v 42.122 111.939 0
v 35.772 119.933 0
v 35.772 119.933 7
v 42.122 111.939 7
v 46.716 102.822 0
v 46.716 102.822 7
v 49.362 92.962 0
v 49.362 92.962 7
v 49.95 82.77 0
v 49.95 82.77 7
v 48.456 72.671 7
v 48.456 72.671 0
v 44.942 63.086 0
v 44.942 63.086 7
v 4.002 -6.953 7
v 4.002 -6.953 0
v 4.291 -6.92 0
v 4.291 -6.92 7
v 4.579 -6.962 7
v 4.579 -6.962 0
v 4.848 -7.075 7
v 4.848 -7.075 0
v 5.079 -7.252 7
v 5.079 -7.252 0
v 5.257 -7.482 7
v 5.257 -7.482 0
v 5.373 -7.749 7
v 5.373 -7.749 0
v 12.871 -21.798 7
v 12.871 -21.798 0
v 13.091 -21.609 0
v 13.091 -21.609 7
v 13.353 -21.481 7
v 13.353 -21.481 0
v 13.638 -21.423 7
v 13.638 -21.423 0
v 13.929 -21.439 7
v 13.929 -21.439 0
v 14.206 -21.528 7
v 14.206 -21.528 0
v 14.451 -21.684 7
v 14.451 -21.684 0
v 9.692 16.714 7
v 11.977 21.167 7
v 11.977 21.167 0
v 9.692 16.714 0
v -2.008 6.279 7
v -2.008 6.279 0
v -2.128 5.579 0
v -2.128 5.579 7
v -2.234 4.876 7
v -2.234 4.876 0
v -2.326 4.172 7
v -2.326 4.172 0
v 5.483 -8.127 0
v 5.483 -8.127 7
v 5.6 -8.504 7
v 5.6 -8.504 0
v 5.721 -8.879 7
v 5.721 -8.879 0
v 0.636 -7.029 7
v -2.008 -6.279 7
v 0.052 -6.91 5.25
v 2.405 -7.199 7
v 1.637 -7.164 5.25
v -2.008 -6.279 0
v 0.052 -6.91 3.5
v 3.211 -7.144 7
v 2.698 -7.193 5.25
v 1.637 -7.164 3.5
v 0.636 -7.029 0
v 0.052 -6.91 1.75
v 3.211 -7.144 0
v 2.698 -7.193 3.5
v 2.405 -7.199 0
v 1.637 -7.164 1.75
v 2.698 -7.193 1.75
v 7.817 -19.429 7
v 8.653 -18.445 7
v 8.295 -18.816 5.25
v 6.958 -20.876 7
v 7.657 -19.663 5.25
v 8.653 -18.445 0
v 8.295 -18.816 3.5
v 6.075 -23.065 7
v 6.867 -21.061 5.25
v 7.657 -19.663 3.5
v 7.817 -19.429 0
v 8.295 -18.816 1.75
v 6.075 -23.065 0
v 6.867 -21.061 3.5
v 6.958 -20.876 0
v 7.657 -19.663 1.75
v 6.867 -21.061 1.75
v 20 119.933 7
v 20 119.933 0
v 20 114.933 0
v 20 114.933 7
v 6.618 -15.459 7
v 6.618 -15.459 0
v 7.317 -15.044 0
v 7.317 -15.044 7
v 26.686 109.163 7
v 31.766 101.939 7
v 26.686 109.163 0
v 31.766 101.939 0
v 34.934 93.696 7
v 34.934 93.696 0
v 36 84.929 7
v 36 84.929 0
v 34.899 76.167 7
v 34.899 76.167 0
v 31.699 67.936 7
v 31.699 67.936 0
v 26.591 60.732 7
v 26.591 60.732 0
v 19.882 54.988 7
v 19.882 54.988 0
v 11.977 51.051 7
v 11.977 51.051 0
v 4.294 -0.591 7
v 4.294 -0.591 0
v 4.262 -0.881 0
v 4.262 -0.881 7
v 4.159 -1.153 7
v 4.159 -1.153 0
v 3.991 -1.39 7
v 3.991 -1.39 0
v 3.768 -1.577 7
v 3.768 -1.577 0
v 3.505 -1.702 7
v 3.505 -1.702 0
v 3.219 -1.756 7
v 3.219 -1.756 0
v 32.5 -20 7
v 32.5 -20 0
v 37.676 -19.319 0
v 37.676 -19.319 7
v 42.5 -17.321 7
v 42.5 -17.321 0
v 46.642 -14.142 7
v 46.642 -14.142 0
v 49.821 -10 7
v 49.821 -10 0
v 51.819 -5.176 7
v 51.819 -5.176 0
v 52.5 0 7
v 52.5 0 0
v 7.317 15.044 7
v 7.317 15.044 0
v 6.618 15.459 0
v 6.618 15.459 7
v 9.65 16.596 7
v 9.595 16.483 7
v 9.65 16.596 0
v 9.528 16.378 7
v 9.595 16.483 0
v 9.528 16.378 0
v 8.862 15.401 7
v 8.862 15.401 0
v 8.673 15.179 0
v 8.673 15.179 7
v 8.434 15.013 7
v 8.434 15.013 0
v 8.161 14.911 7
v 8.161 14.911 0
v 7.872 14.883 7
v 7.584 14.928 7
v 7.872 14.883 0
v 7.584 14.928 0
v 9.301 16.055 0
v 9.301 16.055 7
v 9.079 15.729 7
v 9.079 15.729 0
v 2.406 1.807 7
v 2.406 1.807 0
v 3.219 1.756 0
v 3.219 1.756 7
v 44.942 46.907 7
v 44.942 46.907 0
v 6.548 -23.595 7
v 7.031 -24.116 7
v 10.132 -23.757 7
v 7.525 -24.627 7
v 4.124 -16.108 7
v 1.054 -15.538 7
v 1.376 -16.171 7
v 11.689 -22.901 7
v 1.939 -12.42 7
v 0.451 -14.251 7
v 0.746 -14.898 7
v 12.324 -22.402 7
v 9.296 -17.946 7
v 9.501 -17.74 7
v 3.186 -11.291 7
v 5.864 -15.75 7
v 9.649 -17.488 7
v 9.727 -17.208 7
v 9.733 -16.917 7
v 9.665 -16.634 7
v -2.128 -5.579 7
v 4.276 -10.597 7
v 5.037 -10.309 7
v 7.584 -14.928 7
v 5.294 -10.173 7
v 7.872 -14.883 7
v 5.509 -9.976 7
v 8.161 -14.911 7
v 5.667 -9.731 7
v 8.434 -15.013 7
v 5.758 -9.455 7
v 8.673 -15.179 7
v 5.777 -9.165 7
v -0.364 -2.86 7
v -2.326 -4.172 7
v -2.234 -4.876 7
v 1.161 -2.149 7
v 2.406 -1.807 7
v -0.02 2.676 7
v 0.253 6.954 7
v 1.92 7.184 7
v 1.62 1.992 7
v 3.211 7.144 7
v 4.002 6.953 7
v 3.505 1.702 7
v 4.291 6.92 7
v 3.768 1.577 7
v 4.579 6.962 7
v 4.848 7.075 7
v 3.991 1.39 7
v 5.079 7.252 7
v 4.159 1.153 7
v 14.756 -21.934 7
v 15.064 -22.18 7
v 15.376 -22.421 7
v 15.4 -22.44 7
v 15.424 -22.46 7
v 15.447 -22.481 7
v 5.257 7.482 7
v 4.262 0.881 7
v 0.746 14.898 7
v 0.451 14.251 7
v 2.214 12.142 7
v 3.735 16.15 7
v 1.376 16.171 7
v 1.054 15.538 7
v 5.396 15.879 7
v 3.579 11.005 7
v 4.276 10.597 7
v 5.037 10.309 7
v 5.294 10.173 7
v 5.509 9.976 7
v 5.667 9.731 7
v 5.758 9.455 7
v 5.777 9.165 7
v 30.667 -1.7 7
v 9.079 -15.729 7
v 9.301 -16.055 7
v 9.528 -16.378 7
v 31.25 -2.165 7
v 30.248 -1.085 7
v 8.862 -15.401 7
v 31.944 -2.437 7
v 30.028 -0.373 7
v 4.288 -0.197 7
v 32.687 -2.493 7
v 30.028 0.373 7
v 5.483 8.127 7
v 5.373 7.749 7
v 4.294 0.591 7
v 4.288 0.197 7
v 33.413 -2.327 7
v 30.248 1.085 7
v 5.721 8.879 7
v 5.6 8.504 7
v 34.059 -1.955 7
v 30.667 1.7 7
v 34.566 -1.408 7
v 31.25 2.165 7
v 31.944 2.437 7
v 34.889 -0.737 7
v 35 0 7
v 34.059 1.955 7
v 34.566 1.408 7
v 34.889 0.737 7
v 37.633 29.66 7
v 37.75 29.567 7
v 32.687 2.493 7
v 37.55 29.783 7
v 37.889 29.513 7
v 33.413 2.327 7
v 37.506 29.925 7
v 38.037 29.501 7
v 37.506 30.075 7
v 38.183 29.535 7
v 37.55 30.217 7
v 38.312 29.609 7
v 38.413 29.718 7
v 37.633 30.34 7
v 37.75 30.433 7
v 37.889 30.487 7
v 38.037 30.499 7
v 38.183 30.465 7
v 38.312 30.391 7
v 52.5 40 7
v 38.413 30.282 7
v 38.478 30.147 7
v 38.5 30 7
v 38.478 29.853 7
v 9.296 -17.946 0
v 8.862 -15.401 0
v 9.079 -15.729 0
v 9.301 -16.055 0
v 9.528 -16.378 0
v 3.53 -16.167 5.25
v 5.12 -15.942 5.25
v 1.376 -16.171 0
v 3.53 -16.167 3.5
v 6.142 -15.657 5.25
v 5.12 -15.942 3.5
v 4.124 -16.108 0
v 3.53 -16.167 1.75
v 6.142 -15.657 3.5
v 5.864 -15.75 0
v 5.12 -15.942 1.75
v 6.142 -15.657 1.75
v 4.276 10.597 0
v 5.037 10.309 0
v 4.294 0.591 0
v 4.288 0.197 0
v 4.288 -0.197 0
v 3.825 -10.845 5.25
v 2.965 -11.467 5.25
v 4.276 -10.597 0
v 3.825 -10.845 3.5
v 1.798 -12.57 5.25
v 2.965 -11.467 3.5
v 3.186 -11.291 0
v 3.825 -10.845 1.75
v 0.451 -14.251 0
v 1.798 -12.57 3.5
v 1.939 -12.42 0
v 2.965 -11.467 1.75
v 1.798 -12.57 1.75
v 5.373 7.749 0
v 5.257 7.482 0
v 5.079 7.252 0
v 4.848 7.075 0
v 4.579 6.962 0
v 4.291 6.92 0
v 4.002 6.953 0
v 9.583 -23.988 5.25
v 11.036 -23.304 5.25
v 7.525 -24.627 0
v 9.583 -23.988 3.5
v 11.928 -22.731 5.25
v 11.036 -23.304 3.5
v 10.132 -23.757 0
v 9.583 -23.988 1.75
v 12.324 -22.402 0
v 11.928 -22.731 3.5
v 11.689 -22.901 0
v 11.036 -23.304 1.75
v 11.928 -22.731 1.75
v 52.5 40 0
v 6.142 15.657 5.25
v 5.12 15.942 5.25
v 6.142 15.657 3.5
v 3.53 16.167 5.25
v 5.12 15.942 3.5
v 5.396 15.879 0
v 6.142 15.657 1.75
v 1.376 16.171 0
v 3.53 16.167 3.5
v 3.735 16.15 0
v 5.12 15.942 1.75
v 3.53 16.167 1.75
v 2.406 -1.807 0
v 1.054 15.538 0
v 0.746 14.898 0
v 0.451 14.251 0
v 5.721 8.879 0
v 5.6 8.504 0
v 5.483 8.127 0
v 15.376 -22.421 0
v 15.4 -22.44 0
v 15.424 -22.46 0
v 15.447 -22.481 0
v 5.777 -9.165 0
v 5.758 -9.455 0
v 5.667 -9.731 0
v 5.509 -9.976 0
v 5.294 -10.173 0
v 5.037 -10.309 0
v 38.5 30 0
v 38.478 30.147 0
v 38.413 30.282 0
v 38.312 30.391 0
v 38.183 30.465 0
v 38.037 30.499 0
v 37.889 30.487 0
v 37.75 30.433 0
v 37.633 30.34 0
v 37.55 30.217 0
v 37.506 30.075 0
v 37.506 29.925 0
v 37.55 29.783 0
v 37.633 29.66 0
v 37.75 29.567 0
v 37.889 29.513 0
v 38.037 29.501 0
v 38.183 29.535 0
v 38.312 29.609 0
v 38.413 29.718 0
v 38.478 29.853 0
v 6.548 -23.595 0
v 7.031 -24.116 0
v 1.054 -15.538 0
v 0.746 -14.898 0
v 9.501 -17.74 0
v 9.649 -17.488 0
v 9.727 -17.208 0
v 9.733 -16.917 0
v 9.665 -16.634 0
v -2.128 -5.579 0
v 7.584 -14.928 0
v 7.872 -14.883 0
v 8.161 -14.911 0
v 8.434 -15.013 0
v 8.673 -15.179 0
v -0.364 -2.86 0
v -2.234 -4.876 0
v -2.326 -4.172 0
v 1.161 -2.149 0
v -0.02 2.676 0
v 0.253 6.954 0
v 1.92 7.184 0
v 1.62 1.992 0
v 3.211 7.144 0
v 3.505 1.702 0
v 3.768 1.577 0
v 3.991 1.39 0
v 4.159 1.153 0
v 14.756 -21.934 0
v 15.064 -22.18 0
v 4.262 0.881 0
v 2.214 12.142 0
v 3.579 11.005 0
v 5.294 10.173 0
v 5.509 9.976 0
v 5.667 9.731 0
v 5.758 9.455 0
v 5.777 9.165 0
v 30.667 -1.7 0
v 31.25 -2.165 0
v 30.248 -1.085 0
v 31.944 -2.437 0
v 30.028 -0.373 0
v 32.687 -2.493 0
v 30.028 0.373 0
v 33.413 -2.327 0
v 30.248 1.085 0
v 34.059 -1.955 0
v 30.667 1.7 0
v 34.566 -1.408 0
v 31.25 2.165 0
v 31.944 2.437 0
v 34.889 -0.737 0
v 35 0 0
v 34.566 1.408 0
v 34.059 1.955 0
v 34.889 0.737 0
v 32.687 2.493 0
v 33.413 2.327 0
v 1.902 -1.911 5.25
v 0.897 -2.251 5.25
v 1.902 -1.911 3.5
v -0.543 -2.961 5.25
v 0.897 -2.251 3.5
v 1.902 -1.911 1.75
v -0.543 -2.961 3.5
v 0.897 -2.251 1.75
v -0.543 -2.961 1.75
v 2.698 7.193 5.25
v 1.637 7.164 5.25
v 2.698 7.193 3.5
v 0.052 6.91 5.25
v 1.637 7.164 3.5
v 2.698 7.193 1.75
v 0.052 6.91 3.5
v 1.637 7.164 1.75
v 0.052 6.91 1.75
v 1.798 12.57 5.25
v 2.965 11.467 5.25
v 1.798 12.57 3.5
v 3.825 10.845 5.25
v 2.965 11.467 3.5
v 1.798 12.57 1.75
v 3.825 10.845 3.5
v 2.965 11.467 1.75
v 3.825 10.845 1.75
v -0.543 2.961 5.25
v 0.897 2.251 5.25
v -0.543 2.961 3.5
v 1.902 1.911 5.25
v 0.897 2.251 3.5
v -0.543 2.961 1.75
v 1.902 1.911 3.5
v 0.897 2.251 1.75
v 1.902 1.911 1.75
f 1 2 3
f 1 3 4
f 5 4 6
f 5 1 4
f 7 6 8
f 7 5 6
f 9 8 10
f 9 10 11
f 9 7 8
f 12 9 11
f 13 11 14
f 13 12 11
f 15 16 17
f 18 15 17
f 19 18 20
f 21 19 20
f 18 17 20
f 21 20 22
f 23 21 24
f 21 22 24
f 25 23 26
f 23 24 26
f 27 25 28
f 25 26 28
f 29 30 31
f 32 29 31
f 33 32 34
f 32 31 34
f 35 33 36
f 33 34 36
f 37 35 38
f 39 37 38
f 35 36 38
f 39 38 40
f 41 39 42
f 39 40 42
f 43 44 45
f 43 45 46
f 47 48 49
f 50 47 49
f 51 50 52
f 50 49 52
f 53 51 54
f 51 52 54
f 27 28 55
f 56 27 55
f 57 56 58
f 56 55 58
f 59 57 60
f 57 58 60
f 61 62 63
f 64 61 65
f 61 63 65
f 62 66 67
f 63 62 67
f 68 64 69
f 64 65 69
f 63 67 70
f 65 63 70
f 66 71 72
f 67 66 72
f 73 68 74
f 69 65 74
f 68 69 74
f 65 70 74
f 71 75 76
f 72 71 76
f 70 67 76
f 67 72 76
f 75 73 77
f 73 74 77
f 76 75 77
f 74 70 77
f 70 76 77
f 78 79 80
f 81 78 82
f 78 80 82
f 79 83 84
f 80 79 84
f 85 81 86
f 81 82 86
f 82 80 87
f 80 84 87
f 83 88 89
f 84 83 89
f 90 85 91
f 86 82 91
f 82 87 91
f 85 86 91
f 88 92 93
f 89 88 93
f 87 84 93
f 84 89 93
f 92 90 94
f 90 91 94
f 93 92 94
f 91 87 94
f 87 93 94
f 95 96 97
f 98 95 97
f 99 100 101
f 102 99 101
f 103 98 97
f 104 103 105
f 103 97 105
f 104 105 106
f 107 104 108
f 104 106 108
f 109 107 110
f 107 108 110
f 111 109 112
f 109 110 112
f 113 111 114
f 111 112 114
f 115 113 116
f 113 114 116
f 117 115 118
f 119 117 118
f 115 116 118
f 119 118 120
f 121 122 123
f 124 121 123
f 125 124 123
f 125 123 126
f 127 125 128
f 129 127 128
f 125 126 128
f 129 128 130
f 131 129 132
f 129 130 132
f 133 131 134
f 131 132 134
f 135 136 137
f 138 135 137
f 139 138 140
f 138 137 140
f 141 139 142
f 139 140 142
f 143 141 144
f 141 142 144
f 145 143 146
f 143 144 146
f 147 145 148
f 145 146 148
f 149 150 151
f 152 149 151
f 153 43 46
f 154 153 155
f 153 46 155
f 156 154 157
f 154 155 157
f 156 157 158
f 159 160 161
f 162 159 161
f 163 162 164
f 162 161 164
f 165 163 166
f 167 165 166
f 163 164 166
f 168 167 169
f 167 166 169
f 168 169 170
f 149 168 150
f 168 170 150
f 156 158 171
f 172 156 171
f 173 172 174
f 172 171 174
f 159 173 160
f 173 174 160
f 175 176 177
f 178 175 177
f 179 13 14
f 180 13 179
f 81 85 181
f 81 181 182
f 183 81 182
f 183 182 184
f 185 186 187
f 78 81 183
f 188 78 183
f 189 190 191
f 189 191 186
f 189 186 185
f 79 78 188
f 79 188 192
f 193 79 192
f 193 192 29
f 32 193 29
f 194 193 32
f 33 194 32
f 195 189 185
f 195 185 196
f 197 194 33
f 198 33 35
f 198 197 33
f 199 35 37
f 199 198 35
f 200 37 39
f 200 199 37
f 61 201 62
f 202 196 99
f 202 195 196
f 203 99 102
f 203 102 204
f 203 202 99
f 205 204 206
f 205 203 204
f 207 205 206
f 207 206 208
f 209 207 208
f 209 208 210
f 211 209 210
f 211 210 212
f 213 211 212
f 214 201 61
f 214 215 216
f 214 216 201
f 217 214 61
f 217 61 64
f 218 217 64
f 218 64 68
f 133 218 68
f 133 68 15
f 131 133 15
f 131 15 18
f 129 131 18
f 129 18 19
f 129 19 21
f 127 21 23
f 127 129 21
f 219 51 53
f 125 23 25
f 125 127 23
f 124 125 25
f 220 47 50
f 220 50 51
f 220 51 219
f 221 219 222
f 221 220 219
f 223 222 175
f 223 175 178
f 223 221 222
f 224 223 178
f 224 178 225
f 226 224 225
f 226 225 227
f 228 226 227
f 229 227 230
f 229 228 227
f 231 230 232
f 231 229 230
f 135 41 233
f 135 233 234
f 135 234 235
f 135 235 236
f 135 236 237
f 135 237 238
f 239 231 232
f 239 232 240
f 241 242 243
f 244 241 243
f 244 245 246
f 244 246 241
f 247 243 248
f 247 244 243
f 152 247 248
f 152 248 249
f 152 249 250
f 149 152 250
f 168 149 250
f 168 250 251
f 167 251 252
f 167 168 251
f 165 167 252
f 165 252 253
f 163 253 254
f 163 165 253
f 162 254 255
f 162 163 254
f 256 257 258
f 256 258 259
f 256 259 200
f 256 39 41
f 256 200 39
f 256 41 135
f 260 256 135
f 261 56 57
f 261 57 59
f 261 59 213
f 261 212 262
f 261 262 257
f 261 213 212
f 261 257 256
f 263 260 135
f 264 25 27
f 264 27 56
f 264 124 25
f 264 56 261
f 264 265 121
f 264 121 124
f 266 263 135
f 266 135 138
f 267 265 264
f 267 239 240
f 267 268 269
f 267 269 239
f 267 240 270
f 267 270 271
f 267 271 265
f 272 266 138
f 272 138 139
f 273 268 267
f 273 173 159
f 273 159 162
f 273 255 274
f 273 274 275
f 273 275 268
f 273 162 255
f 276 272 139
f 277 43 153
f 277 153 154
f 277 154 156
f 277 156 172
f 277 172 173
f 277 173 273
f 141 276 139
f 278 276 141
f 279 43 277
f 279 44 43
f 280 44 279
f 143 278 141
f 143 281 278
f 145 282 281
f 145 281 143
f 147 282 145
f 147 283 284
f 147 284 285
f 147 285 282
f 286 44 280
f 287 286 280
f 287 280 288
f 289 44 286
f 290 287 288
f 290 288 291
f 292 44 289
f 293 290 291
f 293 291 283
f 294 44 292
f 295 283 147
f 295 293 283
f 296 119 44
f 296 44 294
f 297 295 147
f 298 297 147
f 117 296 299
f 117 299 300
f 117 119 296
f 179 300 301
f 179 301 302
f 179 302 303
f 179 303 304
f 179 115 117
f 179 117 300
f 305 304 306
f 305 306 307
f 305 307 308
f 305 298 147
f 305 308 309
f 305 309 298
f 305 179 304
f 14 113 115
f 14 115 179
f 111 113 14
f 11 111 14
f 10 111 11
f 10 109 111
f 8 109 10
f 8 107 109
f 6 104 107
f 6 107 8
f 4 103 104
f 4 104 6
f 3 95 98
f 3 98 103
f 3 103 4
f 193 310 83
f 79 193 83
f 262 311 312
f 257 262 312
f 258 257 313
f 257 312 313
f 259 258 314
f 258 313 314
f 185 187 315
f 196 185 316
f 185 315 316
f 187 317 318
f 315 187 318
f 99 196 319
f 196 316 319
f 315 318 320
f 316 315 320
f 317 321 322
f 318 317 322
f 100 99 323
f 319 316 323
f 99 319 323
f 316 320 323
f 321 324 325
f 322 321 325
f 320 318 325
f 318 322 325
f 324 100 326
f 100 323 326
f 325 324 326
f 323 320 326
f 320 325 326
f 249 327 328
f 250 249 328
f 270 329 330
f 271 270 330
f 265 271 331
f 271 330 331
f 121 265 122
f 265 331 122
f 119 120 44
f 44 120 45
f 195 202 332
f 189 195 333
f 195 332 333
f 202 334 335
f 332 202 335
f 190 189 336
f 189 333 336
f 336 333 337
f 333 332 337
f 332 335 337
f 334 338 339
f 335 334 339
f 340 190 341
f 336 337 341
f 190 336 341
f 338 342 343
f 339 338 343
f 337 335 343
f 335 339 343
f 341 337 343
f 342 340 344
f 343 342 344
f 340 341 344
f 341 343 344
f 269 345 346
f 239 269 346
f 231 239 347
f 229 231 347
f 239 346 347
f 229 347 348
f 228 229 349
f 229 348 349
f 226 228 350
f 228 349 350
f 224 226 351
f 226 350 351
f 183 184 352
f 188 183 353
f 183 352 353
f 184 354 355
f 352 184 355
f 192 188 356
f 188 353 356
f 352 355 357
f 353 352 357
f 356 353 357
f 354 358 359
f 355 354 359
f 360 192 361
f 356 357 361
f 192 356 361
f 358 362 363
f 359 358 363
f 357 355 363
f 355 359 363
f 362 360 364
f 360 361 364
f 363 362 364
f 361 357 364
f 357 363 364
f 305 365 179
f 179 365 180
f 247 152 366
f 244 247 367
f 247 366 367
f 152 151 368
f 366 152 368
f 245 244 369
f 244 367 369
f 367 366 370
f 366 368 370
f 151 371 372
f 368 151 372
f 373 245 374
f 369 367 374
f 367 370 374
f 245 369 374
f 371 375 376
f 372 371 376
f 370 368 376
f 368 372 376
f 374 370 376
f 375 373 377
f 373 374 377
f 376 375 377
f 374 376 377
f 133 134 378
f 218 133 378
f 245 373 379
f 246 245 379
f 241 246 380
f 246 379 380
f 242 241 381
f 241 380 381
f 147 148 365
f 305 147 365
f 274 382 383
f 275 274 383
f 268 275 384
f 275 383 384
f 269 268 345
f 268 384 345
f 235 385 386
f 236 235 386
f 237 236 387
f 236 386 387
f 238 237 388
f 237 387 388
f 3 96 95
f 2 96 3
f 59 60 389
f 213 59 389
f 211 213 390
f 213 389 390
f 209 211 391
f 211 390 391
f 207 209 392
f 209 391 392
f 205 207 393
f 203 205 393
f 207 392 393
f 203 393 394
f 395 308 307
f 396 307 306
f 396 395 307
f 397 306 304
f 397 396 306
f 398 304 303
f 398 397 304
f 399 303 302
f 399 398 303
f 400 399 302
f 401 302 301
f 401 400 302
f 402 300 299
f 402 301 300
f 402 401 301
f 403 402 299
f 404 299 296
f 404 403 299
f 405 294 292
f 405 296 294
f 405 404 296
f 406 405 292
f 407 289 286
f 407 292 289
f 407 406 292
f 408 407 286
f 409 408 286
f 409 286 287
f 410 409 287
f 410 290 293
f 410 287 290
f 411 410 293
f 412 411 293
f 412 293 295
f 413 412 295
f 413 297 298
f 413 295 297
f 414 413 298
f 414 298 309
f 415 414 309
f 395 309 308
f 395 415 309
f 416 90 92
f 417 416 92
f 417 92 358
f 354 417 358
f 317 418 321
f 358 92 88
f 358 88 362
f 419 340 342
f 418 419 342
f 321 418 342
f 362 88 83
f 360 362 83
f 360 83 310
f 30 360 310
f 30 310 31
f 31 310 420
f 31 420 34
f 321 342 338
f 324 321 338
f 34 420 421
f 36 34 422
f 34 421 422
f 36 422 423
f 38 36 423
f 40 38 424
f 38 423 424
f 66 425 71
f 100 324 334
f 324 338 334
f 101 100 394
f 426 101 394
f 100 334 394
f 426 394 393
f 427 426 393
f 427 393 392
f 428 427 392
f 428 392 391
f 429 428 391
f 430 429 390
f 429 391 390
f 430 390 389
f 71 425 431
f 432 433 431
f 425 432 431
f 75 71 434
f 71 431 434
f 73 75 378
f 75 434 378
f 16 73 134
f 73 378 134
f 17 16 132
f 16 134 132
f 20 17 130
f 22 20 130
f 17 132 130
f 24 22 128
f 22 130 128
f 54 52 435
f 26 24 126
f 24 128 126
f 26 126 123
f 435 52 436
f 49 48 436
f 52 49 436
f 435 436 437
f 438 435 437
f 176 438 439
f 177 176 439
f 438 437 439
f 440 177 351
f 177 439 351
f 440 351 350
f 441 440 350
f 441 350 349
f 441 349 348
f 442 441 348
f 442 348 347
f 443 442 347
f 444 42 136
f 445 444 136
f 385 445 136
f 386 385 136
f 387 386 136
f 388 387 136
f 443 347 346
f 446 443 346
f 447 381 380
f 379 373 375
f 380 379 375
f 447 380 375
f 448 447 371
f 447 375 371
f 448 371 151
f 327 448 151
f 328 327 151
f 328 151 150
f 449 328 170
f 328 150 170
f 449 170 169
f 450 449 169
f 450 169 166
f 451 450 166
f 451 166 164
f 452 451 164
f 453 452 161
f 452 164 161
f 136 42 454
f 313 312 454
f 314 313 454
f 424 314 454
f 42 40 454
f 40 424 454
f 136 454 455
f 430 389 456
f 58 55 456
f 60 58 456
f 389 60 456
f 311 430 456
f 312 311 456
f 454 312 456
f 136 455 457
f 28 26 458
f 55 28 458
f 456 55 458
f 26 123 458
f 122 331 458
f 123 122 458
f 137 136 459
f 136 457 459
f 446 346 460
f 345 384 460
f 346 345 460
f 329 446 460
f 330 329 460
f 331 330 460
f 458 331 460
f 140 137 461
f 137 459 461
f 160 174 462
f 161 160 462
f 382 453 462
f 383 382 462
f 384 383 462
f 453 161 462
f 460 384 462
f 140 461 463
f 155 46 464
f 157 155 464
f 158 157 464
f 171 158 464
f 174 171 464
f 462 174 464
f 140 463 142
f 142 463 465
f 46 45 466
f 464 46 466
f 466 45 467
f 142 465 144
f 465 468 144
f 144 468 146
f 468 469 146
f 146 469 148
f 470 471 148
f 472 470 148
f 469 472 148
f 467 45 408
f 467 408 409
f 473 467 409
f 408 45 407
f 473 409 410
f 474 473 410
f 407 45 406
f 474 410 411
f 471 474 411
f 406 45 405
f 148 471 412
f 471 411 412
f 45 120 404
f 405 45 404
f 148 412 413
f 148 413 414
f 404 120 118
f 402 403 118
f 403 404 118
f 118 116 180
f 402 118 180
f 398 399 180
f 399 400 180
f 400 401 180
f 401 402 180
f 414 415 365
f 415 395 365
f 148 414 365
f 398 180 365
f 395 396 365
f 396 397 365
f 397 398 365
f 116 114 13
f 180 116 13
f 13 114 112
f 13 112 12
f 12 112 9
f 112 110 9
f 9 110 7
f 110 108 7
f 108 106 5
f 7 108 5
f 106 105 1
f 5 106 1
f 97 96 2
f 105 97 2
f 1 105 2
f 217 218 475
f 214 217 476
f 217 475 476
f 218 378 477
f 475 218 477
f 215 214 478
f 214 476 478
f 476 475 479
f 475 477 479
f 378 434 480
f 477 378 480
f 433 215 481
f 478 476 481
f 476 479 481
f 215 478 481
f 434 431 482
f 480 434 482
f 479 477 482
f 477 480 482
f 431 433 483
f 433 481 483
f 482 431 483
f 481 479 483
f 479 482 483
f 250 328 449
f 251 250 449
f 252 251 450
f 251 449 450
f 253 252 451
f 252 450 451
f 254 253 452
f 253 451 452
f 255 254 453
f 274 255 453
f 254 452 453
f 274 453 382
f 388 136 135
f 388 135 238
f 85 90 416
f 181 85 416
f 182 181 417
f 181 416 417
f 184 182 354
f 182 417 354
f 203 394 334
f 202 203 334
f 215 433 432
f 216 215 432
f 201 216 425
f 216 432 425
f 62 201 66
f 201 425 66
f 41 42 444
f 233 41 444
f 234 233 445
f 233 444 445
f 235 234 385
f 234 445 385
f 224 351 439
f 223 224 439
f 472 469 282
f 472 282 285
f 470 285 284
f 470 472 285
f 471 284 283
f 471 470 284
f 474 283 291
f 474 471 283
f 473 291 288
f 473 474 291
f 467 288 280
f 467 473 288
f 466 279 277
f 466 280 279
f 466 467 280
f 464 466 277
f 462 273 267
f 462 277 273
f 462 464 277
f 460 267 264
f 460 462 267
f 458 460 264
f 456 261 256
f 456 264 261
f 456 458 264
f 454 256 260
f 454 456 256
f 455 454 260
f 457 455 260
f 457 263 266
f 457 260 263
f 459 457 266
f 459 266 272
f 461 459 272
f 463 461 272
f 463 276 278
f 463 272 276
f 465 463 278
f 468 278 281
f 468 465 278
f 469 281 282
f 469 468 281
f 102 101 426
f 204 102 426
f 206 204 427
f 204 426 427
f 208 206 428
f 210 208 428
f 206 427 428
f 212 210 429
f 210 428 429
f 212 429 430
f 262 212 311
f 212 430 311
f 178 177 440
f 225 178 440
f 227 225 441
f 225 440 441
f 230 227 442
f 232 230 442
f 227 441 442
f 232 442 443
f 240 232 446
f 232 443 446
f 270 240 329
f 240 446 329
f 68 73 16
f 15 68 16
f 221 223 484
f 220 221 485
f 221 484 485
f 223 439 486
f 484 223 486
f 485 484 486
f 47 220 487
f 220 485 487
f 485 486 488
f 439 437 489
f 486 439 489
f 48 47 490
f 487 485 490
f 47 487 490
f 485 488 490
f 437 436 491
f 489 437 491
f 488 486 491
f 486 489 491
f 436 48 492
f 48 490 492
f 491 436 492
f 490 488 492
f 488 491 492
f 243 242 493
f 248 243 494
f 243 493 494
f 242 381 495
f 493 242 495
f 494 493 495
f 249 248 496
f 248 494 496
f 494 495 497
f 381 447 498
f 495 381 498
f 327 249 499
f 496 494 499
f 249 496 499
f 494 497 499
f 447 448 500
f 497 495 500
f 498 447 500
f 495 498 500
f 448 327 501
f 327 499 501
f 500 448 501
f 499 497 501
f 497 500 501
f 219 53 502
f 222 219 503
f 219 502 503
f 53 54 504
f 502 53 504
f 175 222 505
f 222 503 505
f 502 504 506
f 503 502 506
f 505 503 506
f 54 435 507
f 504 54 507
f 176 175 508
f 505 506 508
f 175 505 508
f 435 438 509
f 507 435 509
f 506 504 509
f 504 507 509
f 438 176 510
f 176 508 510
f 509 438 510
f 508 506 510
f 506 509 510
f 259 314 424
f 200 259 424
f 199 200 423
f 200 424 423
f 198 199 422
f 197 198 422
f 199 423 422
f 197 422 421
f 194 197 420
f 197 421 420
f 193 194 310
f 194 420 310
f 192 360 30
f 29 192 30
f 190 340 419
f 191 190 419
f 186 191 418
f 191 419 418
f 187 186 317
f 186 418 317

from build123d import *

# Parameters (mm, degrees)
CYLINDER002_R     = 0.5
CYLINDER002_DEPTH = 15
PAD005_DEPTH      = 10
CYLINDER001_R     = 2.5
CYLINDER001_DEPTH = 30
PAD_DEPTH         = 7
PAD001_DEPTH      = 7


with BuildPart() as fixation_servo:
    # Cylinder002 → Cylinder002 (new body)
    with BuildSketch(Plane(origin=(38, 30, 0), x_dir=(1, 0, 0), z_dir=(0, 0, 1))):
        Circle(CYLINDER002_R)
    extrude(amount=CYLINDER002_DEPTH)


with BuildPart() as gearcutter_d:
    # Sketch007 → Pad005 (new body)
    with BuildSketch(Plane.XY):
        with BuildLine():
            Line((20, 31.95888), (45.304215, 31.95888))
            Line((45.304215, 31.95888), (45.304215, -33.652056))
            Line((45.304215, -33.652056), (23.213182, -33.652056))
            Line((-17.372387, -39.01239), (23.213182, -33.652056))
            Line((-25.984375, -33.578197), (-17.372387, -39.01239))
            Line((-17.23691, -22.507347), (-25.984375, -33.578197))
            Line((7e-06, -20), (-17.23691, -22.507347))
            ThreePointArc((7e-06, -20), (14.142138, -14.142133), (20, 0))
            Line((20, 0), (20, 31.95888))
        make_face()
        Polygon((-20, 22.185684), (-22.978563, 16.381247), (-30, 23.81991), (-24.00174, 30), align=None)
    extrude(amount=PAD005_DEPTH)


with BuildPart() as hole:
    # Cylinder001 → Cylinder001 (new body)
    with BuildSketch(Plane.XY.offset(-10)):
        Circle(CYLINDER001_R)
    extrude(amount=CYLINDER001_DEPTH)


with BuildPart() as cut002:
    # InvoluteGear → Pad (new body)
    with BuildSketch(Plane.XY):
        with BuildLine():
            Line((29.216017, -2.627852), (30.02668, -2.698596))
            add(Edge.make_bspline(
                [(30.02668, -2.698596), (30.269336, -2.702327), (31.240634, -2.684194), (32.940327, -2.265756), (35.058609, -1.065575)],
                knots=[0, 0, 0, 0, 0, 1, 1, 1, 1, 1], degree=4))
            ThreePointArc((35.058609, -1.065575), (35.074799, 0), (35.058609, 1.065575))
            add(Edge.make_bspline(
                [(35.058609, 1.065575), (32.940327, 2.265756), (31.240634, 2.684194), (30.269336, 2.702327), (30.02668, 2.698596)],
                knots=[0, 0, 0, 0, 0, 1, 1, 1, 1, 1], degree=4))
            Line((30.02668, 2.698596), (29.216017, 2.627852))
            ThreePointArc((29.216017, 2.627852), (28.398075, 2.874673), (27.979368, 3.61941))
            ThreePointArc((27.979368, 3.61941), (27.89739, 4.204855), (27.803163, 4.788454))
            ThreePointArc((27.803163, 4.788454), (27.983753, 5.62352), (28.692604, 6.100468))
            Line((28.692604, 6.100468), (29.488104, 6.271815))
            add(Edge.make_bspline(
                [(29.488104, 6.271815), (29.72108, 6.339774), (30.64388, 6.643396), (32.144724, 7.544237), (33.815137, 9.315472)],
                knots=[0, 0, 0, 0, 0, 1, 1, 1, 1, 1], degree=4))
            ThreePointArc((33.815137, 9.315472), (33.516524, 10.338478), (33.18697, 11.351941))
            add(Edge.make_bspline(
                [(33.18697, 11.351941), (30.809038, 11.874427), (29.06152, 11.773281), (28.12803, 11.504313), (27.897254, 11.429224)],
                knots=[0, 0, 0, 0, 0, 1, 1, 1, 1, 1], degree=4))
            Line((27.897254, 11.429224), (27.143458, 11.122676))
            ThreePointArc((27.143458, 11.122676), (26.289104, 11.117439), (25.669483, 11.705673))
            ThreePointArc((25.669483, 11.705673), (25.418584, 12.240945), (25.156525, 12.770842))
            ThreePointArc((25.156525, 12.770842), (25.082952, 13.622039), (25.619728, 14.286735))
            Line((25.619728, 14.286735), (26.32938, 14.684947))
            add(Edge.make_bspline(
                [(26.32938, 14.684947), (26.531974, 14.818557), (27.324283, 15.380691), (28.492921, 16.683892), (29.567042, 18.868799)],
                knots=[0, 0, 0, 0, 0, 1, 1, 1, 1, 1], degree=4))
            ThreePointArc((29.567042, 18.868799), (28.980159, 19.758338), (28.366523, 20.629637))
            add(Edge.make_bspline(
                [(28.366523, 20.629637), (25.94023, 20.428003), (24.300163, 19.816261), (23.487425, 19.284092), (23.289034, 19.144315)],
                knots=[0, 0, 0, 0, 0, 1, 1, 1, 1, 1], degree=4))
            Line((23.289034, 19.144315), (22.659084, 18.629202))
            ThreePointArc((22.659084, 18.629202), (21.84423, 18.372372), (21.078752, 18.751836))
            ThreePointArc((21.078752, 18.751836), (20.681226, 19.189373), (20.274619, 19.618485))
            ThreePointArc((20.274619, 19.618485), (19.95342, 20.41018), (20.270426, 21.203563))
            Line((20.270426, 21.203563), (20.831176, 21.793257))
            add(Edge.make_bspline(
                [(20.831176, 21.793257), (20.985387, 21.980647), (21.576804, 22.751344), (22.309397, 24.341109), (22.691785, 26.745549)],
                knots=[0, 0, 0, 0, 0, 1, 1, 1, 1, 1], degree=4))
            ThreePointArc((22.691785, 26.745549), (21.868779, 27.422582), (21.025585, 28.074299))
            add(Edge.make_bspline(
                [(21.025585, 28.074299), (18.766519, 27.166461), (17.37963, 26.098479), (16.759858, 25.350393), (16.611482, 25.15835)],
                knots=[0, 0, 0, 0, 0, 1, 1, 1, 1, 1], degree=4))
            Line((16.611482, 25.15835), (16.161351, 24.480441))
            ThreePointArc((16.161351, 24.480441), (15.4584, 23.994839), (14.615082, 24.131816))
            ThreePointArc((14.615082, 24.131816), (14.10625, 24.432742), (13.591225, 24.72294))
            ThreePointArc((13.591225, 24.72294), (13.05094, 25.384787), (13.120008, 26.236361))
            Line((13.120008, 26.236361), (13.48203, 26.96514))
            add(Edge.make_bspline(
                [(13.48203, 26.96514), (13.574155, 27.18966), (13.912131, 28.10044), (14.143586, 29.835512), (13.800264, 32.245841)],
                knots=[0, 0, 0, 0, 0, 1, 1, 1, 1, 1], degree=4))
            ThreePointArc((13.800264, 32.245841), (12.814263, 32.65021), (11.816433, 33.024437))
            add(Edge.make_bspline(
                [(11.816433, 33.024437), (9.92532, 31.49106), (8.91484, 30.061732), (8.543105, 29.164202), (8.457926, 28.936956)],
                knots=[0, 0, 0, 0, 0, 1, 1, 1, 1, 1], degree=4))
            Line((8.457926, 28.936956), (8.227611, 28.156485))
            ThreePointArc((8.227611, 28.156485), (7.699024, 27.485259), (6.852797, 27.367578))
            ThreePointArc((6.852797, 27.367578), (6.277872, 27.505154), (5.70019, 27.630653))
            ThreePointArc((5.70019, 27.630653), (4.988826, 28.103844), (4.80382, 28.937943))
            Line((4.80382, 28.937943), (4.934946, 29.741053))
            add(Edge.make_bspline(
                [(4.934946, 29.741053), (4.956801, 29.982752), (5.011304, 30.952689), (4.721054, 32.678899), (3.682528, 34.880948)],
                knots=[0, 0, 0, 0, 0, 1, 1, 1, 1, 1], degree=4))
            ThreePointArc((3.682528, 34.880948), (2.621143, 34.976723), (1.557338, 35.040209))
            add(Edge.make_bspline(
                [(1.557338, 35.040209), (0.202213, 33.01754), (-0.342073, 31.353869), (-0.43274, 30.386642), (-0.447153, 30.144385)],
                knots=[0, 0, 0, 0, 0, 1, 1, 1, 1, 1], degree=4))
            Line((-0.447153, 30.144385), (-0.437188, 29.330703))
            ThreePointArc((-0.437188, 29.330703), (-0.744444, 28.533493), (-1.518389, 28.171611))
            ThreePointArc((-1.518389, 28.171611), (-2.108323, 28.133612), (-2.697331, 28.083261))
            ThreePointArc((-2.697331, 28.083261), (-3.516567, 28.325751), (-3.939209, 29.068262))
            Line((-3.939209, 29.068262), (-4.050629, 29.874342))
            add(Edge.make_bspline(
                [(-4.050629, 29.874342), (-4.100987, 30.111745), (-4.3348, 31.054656), (-5.120964, 32.618623), (-6.762416, 34.416729)],
                knots=[0, 0, 0, 0, 0, 1, 1, 1, 1, 1], degree=4))
            ThreePointArc((-6.762416, 34.416729), (-7.804877, 34.195401), (-8.840133, 33.942504))
            add(Edge.make_bspline(
                [(-8.840133, 33.942504), (-9.538861, 31.610267), (-9.56859, 29.860077), (-9.370135, 28.909097), (-9.312501, 28.673354)],
                knots=[0, 0, 0, 0, 0, 1, 1, 1, 1, 1], degree=4))
            Line((-9.312501, 28.673354), (-9.063142, 27.898758))
            ThreePointArc((-9.063142, 27.898758), (-9.121765, 27.046401), (-9.754659, 26.472472))
            ThreePointArc((-9.754659, 26.472472), (-10.307184, 26.262276), (-10.855183, 26.040548))
            ThreePointArc((-10.855183, 26.040548), (-11.709498, 26.030791), (-12.332222, 26.615739))
            Line((-12.332222, 26.615739), (-12.676288, 27.353165))
            add(Edge.make_bspline(
                [(-12.676288, 27.353165), (-12.794385, 27.565178), (-13.295737, 28.39728), (-14.507962, 29.660038), (-16.60649, 30.894434)],
                knots=[0, 0, 0, 0, 0, 1, 1, 1, 1, 1], degree=4))
            ThreePointArc((-16.60649, 30.894434), (-17.537399, 30.375667), (-18.452119, 29.828859))
            add(Edge.make_bspline(
                [(-18.452119, 29.828859), (-18.432366, 27.394282), (-17.944897, 25.713086), (-17.474952, 24.862851), (-17.350392, 24.65457)],
                knots=[0, 0, 0, 0, 0, 1, 1, 1, 1, 1], degree=4))
            Line((-17.350392, 24.65457), (-16.883795, 23.987887))
            ThreePointArc((-16.883795, 23.987887), (-16.688578, 23.156118), (-17.124185, 22.421138))
            ThreePointArc((-17.124185, 22.421138), (-17.590206, 22.057421), (-18.048504, 21.684019))
            ThreePointArc((-18.048504, 21.684019), (-18.861988, 21.422881), (-19.629463, 21.79829))
            Line((-19.629463, 21.79829), (-20.175603, 22.401539))
            add(Edge.make_bspline(
                [(-20.175603, 22.401539), (-20.350945, 22.569323), (-21.07529, 23.216681), (-22.605863, 24.066029), (-24.975004, 24.627032)],
                knots=[0, 0, 0, 0, 0, 1, 1, 1, 1, 1], degree=4))
            ThreePointArc((-24.975004, 24.627032), (-25.711647, 23.856922), (-26.424554, 23.064789))
            add(Edge.make_bspline(
                [(-26.424554, 23.064789), (-25.688074, 20.744196), (-24.726721, 19.281374), (-24.027043, 18.607432), (-23.846625, 18.445118)],
                knots=[0, 0, 0, 0, 0, 1, 1, 1, 1, 1], degree=4))
            Line((-23.846625, 18.445118), (-23.204249, 17.945586))
            ThreePointArc((-23.204249, 17.945586), (-22.772537, 17.208312), (-22.972152, 16.377588))
            ThreePointArc((-22.972152, 16.377588), (-23.310261, 15.892667), (-23.638136, 15.400768))
            ThreePointArc((-23.638136, 15.400768), (-24.338508, 14.911454), (-25.182539, 15.043968))
            Line((-25.182539, 15.043968), (-25.882227, 15.459439))
            add(Edge.make_bspline(
                [(-25.882227, 15.459439), (-26.099234, 15.568085), (-26.982211, 15.973178), (-28.695135, 16.333648), (-31.12438, 16.17141)],
                knots=[0, 0, 0, 0, 0, 1, 1, 1, 1, 1], degree=4))
            ThreePointArc((-31.12438, 16.17141), (-31.601302, 15.218385), (-32.049051, 14.251311))
            add(Edge.make_bspline(
                [(-32.049051, 14.251311), (-30.661284, 12.250897), (-29.311467, 11.136428), (-28.444225, 10.698661), (-28.22398, 10.596737)],
                knots=[0, 0, 0, 0, 0, 1, 1, 1, 1, 1], degree=4))
            Line((-28.22398, 10.596737), (-27.462904, 10.308742))
            ThreePointArc((-27.462904, 10.308742), (-26.833056, 9.731472), (-26.778943, 8.878817))
            ThreePointArc((-26.778943, 8.878817), (-26.959098, 8.31578), (-27.127416, 7.749093))
            ThreePointArc((-27.127416, 7.749093), (-27.652445, 7.075079), (-28.498037, 6.952923))
            Line((-28.498037, 6.952923), (-29.289102, 7.143699))
            add(Edge.make_bspline(
                [(-29.289102, 7.143699), (-29.528492, 7.183554), (-30.491644, 7.310388), (-32.234718, 7.14995), (-34.508218, 6.278888)],
                knots=[0, 0, 0, 0, 0, 1, 1, 1, 1, 1], degree=4))
            ThreePointArc((-34.508218, 6.278888), (-34.683042, 5.227628), (-34.825849, 4.171541))
            add(Edge.make_bspline(
                [(-34.825849, 4.171541), (-32.910105, 2.669052), (-31.29176, 2.001961), (-30.334014, 1.839267), (-30.093511, 1.80679)],
                knots=[0, 0, 0, 0, 0, 1, 1, 1, 1, 1], degree=4))
            Line((-30.093511, 1.80679), (-29.281359, 1.75592))
            ThreePointArc((-29.281359, 1.75592), (-28.50934, 1.389948), (-28.206307, 0.591124))
            ThreePointArc((-28.206307, 0.591124), (-28.2125, 0), (-28.206307, -0.591124))
            ThreePointArc((-28.206307, -0.591124), (-28.50934, -1.389948), (-29.281359, -1.75592))
            Line((-29.281359, -1.75592), (-30.093511, -1.80679))
            add(Edge.make_bspline(
                [(-30.093511, -1.80679), (-30.334014, -1.839267), (-31.29176, -2.001961), (-32.910105, -2.669052), (-34.825849, -4.171541)],
                knots=[0, 0, 0, 0, 0, 1, 1, 1, 1, 1], degree=4))
            ThreePointArc((-34.825849, -4.171541), (-34.683042, -5.227628), (-34.508218, -6.278888))
            add(Edge.make_bspline(
                [(-34.508218, -6.278888), (-32.234718, -7.14995), (-30.491644, -7.310388), (-29.528492, -7.183554), (-29.289102, -7.143699)],
                knots=[0, 0, 0, 0, 0, 1, 1, 1, 1, 1], degree=4))
            Line((-29.289102, -7.143699), (-28.498037, -6.952923))
            ThreePointArc((-28.498037, -6.952923), (-27.652445, -7.075079), (-27.127416, -7.749093))
            ThreePointArc((-27.127416, -7.749093), (-26.959098, -8.31578), (-26.778943, -8.878817))
            ThreePointArc((-26.778943, -8.878817), (-26.833056, -9.731472), (-27.462904, -10.308742))
            Line((-27.462904, -10.308742), (-28.22398, -10.596737))
            add(Edge.make_bspline(
                [(-28.22398, -10.596737), (-28.444225, -10.698661), (-29.311467, -11.136428), (-30.661284, -12.250897), (-32.049051, -14.251311)],
                knots=[0, 0, 0, 0, 0, 1, 1, 1, 1, 1], degree=4))
            ThreePointArc((-32.049051, -14.251311), (-31.601302, -15.218385), (-31.12438, -16.17141))
            add(Edge.make_bspline(
                [(-31.12438, -16.17141), (-28.695135, -16.333648), (-26.982211, -15.973178), (-26.099234, -15.568085), (-25.882227, -15.459439)],
                knots=[0, 0, 0, 0, 0, 1, 1, 1, 1, 1], degree=4))
            Line((-25.882227, -15.459439), (-25.182539, -15.043968))
            ThreePointArc((-25.182539, -15.043968), (-24.338508, -14.911454), (-23.638136, -15.400768))
            ThreePointArc((-23.638136, -15.400768), (-23.310261, -15.892667), (-22.972152, -16.377588))
            ThreePointArc((-22.972152, -16.377588), (-22.772537, -17.208312), (-23.204249, -17.945586))
            Line((-23.204249, -17.945586), (-23.846625, -18.445118))
            add(Edge.make_bspline(
                [(-23.846625, -18.445118), (-24.027043, -18.607432), (-24.726721, -19.281374), (-25.688074, -20.744196), (-26.424554, -23.064789)],
                knots=[0, 0, 0, 0, 0, 1, 1, 1, 1, 1], degree=4))
            ThreePointArc((-26.424554, -23.064789), (-25.711647, -23.856922), (-24.975004, -24.627032))
            add(Edge.make_bspline(
                [(-24.975004, -24.627032), (-22.605863, -24.066029), (-21.07529, -23.216681), (-20.350945, -22.569323), (-20.175603, -22.401539)],
                knots=[0, 0, 0, 0, 0, 1, 1, 1, 1, 1], degree=4))
            Line((-20.175603, -22.401539), (-19.629463, -21.79829))
            ThreePointArc((-19.629463, -21.79829), (-18.861988, -21.422881), (-18.048504, -21.684019))
            ThreePointArc((-18.048504, -21.684019), (-17.590206, -22.057421), (-17.124185, -22.421138))
            ThreePointArc((-17.124185, -22.421138), (-16.688578, -23.156118), (-16.883795, -23.987887))
            Line((-16.883795, -23.987887), (-17.350392, -24.65457))
            add(Edge.make_bspline(
                [(-17.350392, -24.65457), (-17.474952, -24.862851), (-17.944897, -25.713086), (-18.432366, -27.394282), (-18.452119, -29.828859)],
                knots=[0, 0, 0, 0, 0, 1, 1, 1, 1, 1], degree=4))
            ThreePointArc((-18.452119, -29.828859), (-17.537399, -30.375667), (-16.60649, -30.894434))
            add(Edge.make_bspline(
                [(-16.60649, -30.894434), (-14.507962, -29.660038), (-13.295737, -28.39728), (-12.794385, -27.565178), (-12.676288, -27.353165)],
                knots=[0, 0, 0, 0, 0, 1, 1, 1, 1, 1], degree=4))
            Line((-12.676288, -27.353165), (-12.332222, -26.615739))
            ThreePointArc((-12.332222, -26.615739), (-11.709498, -26.030791), (-10.855183, -26.040548))
            ThreePointArc((-10.855183, -26.040548), (-10.307184, -26.262276), (-9.754659, -26.472472))
            ThreePointArc((-9.754659, -26.472472), (-9.121765, -27.046401), (-9.063142, -27.898758))
            Line((-9.063142, -27.898758), (-9.312501, -28.673354))
            add(Edge.make_bspline(
                [(-9.312501, -28.673354), (-9.370135, -28.909097), (-9.56859, -29.860077), (-9.538861, -31.610267), (-8.840133, -33.942504)],
                knots=[0, 0, 0, 0, 0, 1, 1, 1, 1, 1], degree=4))
            ThreePointArc((-8.840133, -33.942504), (-7.804877, -34.195401), (-6.762416, -34.416729))
            add(Edge.make_bspline(
                [(-6.762416, -34.416729), (-5.120964, -32.618623), (-4.3348, -31.054656), (-4.100987, -30.111745), (-4.050629, -29.874342)],
                knots=[0, 0, 0, 0, 0, 1, 1, 1, 1, 1], degree=4))
            Line((-4.050629, -29.874342), (-3.939209, -29.068262))
            ThreePointArc((-3.939209, -29.068262), (-3.516567, -28.325751), (-2.697331, -28.083261))
            ThreePointArc((-2.697331, -28.083261), (-2.108323, -28.133612), (-1.518389, -28.171611))
            ThreePointArc((-1.518389, -28.171611), (-0.744444, -28.533493), (-0.437188, -29.330703))
            Line((-0.437188, -29.330703), (-0.447153, -30.144385))
            add(Edge.make_bspline(
                [(-0.447153, -30.144385), (-0.43274, -30.386642), (-0.342073, -31.353869), (0.202213, -33.01754), (1.557338, -35.040209)],
                knots=[0, 0, 0, 0, 0, 1, 1, 1, 1, 1], degree=4))
            ThreePointArc((1.557338, -35.040209), (2.621143, -34.976723), (3.682528, -34.880948))
            add(Edge.make_bspline(
                [(3.682528, -34.880948), (4.721054, -32.678899), (5.011304, -30.952689), (4.956801, -29.982752), (4.934946, -29.741053)],
                knots=[0, 0, 0, 0, 0, 1, 1, 1, 1, 1], degree=4))
            Line((4.934946, -29.741053), (4.80382, -28.937943))
            ThreePointArc((4.80382, -28.937943), (4.988826, -28.103844), (5.70019, -27.630653))
            ThreePointArc((5.70019, -27.630653), (6.277872, -27.505154), (6.852797, -27.367578))
            ThreePointArc((6.852797, -27.367578), (7.699024, -27.485259), (8.227611, -28.156485))
            Line((8.227611, -28.156485), (8.457926, -28.936956))
            add(Edge.make_bspline(
                [(8.457926, -28.936956), (8.543105, -29.164202), (8.91484, -30.061732), (9.92532, -31.49106), (11.816433, -33.024437)],
                knots=[0, 0, 0, 0, 0, 1, 1, 1, 1, 1], degree=4))
            ThreePointArc((11.816433, -33.024437), (12.814263, -32.65021), (13.800264, -32.245841))
            add(Edge.make_bspline(
                [(13.800264, -32.245841), (14.143586, -29.835512), (13.912131, -28.10044), (13.574155, -27.18966), (13.48203, -26.96514)],
                knots=[0, 0, 0, 0, 0, 1, 1, 1, 1, 1], degree=4))
            Line((13.48203, -26.96514), (13.120008, -26.236361))
            ThreePointArc((13.120008, -26.236361), (13.05094, -25.384787), (13.591225, -24.72294))
            ThreePointArc((13.591225, -24.72294), (14.10625, -24.432742), (14.615082, -24.131816))
            ThreePointArc((14.615082, -24.131816), (15.4584, -23.994839), (16.161351, -24.480441))
            Line((16.161351, -24.480441), (16.611482, -25.15835))
            add(Edge.make_bspline(
                [(16.611482, -25.15835), (16.759858, -25.350393), (17.37963, -26.098479), (18.766519, -27.166461), (21.025585, -28.074299)],
                knots=[0, 0, 0, 0, 0, 1, 1, 1, 1, 1], degree=4))
            ThreePointArc((21.025585, -28.074299), (21.868779, -27.422582), (22.691785, -26.745549))
            add(Edge.make_bspline(
                [(22.691785, -26.745549), (22.309397, -24.341109), (21.576804, -22.751344), (20.985387, -21.980647), (20.831176, -21.793257)],
                knots=[0, 0, 0, 0, 0, 1, 1, 1, 1, 1], degree=4))
            Line((20.831176, -21.793257), (20.270426, -21.203563))
            ThreePointArc((20.270426, -21.203563), (19.95342, -20.41018), (20.274619, -19.618485))
            ThreePointArc((20.274619, -19.618485), (20.681226, -19.189373), (21.078752, -18.751836))
            ThreePointArc((21.078752, -18.751836), (21.84423, -18.372372), (22.659084, -18.629202))
            Line((22.659084, -18.629202), (23.289034, -19.144315))
            add(Edge.make_bspline(
                [(23.289034, -19.144315), (23.487425, -19.284092), (24.300163, -19.816261), (25.94023, -20.428003), (28.366523, -20.629637)],
                knots=[0, 0, 0, 0, 0, 1, 1, 1, 1, 1], degree=4))
            ThreePointArc((28.366523, -20.629637), (28.980159, -19.758338), (29.567042, -18.868799))
            add(Edge.make_bspline(
                [(29.567042, -18.868799), (28.492921, -16.683892), (27.324283, -15.380691), (26.531974, -14.818557), (26.32938, -14.684947)],
                knots=[0, 0, 0, 0, 0, 1, 1, 1, 1, 1], degree=4))
            Line((26.32938, -14.684947), (25.619728, -14.286735))
            ThreePointArc((25.619728, -14.286735), (25.082952, -13.622039), (25.156525, -12.770842))
            ThreePointArc((25.156525, -12.770842), (25.418584, -12.240945), (25.669483, -11.705673))
            ThreePointArc((25.669483, -11.705673), (26.289104, -11.117439), (27.143458, -11.122676))
            Line((27.143458, -11.122676), (27.897254, -11.429224))
            add(Edge.make_bspline(
                [(27.897254, -11.429224), (28.12803, -11.504313), (29.06152, -11.773281), (30.809038, -11.874427), (33.18697, -11.351941)],
                knots=[0, 0, 0, 0, 0, 1, 1, 1, 1, 1], degree=4))
            ThreePointArc((33.18697, -11.351941), (33.516524, -10.338478), (33.815137, -9.315472))
            add(Edge.make_bspline(
                [(33.815137, -9.315472), (32.144724, -7.544237), (30.64388, -6.643396), (29.72108, -6.339774), (29.488104, -6.271815)],
                knots=[0, 0, 0, 0, 0, 1, 1, 1, 1, 1], degree=4))
            Line((29.488104, -6.271815), (28.692604, -6.100468))
            ThreePointArc((28.692604, -6.100468), (27.983753, -5.62352), (27.803163, -4.788454))
            ThreePointArc((27.803163, -4.788454), (27.89739, -4.204855), (27.979368, -3.61941))
            ThreePointArc((27.979368, -3.61941), (28.398075, -2.874673), (29.216017, -2.627852))
        make_face()
    extrude(amount=PAD_DEPTH)

    # Cut: cut hole
    add(hole.part, mode=Mode.SUBTRACT)

    # Cut002: cut gearcutter_d
    add(gearcutter_d.part, mode=Mode.SUBTRACT)


with BuildPart() as clone_of_pad002:
    # Sketch001 → Pad001 (new body)
    with BuildSketch(Plane.XY):
        with BuildLine():
            Line((20.522763, 10), (-20, 10))
            Line((-20, 10), (-20, 40))
            Line((-20, 40), (-12.44178, 46.907085))
            Line((-12.44178, 63.085703), (-12.44178, 46.907085))
            ThreePointArc((-3.272439, 119.933259), (-16.862004, 92.961944), (-12.44178, 63.085703))
            Line((12.5, 119.933259), (-3.272439, 119.933259))
            Line((12.5, 119.933259), (12.5, 114.933259))
            ThreePointArc((12.5, 114.933259), (-3.21942, 80.514127), (20.522763, 51.050835))
            Line((20.522763, 51.050835), (20.522763, 10))
        make_face()
    extrude(amount=PAD001_DEPTH)


with BuildPart() as pince_d_servo:
    # Part__Mirroring: instance of Clone of Pad002
    add(clone_of_pad002.part.mirror(Plane(origin=(0, 0, 0), x_dir=(0, -1, 0), z_dir=(1, 0, 0))))

    # Fusion001: union Cut002
    add(cut002.part)


with BuildPart() as pince_d_servo_1:
    # Clone013 placement: moved
    add(pince_d_servo.part.moved(Location((32.5, 0, 0))))

    # Cut006: cut fixation_servo
    add(fixation_servo.part, mode=Mode.SUBTRACT)


solid = pince_d_servo_1.part
